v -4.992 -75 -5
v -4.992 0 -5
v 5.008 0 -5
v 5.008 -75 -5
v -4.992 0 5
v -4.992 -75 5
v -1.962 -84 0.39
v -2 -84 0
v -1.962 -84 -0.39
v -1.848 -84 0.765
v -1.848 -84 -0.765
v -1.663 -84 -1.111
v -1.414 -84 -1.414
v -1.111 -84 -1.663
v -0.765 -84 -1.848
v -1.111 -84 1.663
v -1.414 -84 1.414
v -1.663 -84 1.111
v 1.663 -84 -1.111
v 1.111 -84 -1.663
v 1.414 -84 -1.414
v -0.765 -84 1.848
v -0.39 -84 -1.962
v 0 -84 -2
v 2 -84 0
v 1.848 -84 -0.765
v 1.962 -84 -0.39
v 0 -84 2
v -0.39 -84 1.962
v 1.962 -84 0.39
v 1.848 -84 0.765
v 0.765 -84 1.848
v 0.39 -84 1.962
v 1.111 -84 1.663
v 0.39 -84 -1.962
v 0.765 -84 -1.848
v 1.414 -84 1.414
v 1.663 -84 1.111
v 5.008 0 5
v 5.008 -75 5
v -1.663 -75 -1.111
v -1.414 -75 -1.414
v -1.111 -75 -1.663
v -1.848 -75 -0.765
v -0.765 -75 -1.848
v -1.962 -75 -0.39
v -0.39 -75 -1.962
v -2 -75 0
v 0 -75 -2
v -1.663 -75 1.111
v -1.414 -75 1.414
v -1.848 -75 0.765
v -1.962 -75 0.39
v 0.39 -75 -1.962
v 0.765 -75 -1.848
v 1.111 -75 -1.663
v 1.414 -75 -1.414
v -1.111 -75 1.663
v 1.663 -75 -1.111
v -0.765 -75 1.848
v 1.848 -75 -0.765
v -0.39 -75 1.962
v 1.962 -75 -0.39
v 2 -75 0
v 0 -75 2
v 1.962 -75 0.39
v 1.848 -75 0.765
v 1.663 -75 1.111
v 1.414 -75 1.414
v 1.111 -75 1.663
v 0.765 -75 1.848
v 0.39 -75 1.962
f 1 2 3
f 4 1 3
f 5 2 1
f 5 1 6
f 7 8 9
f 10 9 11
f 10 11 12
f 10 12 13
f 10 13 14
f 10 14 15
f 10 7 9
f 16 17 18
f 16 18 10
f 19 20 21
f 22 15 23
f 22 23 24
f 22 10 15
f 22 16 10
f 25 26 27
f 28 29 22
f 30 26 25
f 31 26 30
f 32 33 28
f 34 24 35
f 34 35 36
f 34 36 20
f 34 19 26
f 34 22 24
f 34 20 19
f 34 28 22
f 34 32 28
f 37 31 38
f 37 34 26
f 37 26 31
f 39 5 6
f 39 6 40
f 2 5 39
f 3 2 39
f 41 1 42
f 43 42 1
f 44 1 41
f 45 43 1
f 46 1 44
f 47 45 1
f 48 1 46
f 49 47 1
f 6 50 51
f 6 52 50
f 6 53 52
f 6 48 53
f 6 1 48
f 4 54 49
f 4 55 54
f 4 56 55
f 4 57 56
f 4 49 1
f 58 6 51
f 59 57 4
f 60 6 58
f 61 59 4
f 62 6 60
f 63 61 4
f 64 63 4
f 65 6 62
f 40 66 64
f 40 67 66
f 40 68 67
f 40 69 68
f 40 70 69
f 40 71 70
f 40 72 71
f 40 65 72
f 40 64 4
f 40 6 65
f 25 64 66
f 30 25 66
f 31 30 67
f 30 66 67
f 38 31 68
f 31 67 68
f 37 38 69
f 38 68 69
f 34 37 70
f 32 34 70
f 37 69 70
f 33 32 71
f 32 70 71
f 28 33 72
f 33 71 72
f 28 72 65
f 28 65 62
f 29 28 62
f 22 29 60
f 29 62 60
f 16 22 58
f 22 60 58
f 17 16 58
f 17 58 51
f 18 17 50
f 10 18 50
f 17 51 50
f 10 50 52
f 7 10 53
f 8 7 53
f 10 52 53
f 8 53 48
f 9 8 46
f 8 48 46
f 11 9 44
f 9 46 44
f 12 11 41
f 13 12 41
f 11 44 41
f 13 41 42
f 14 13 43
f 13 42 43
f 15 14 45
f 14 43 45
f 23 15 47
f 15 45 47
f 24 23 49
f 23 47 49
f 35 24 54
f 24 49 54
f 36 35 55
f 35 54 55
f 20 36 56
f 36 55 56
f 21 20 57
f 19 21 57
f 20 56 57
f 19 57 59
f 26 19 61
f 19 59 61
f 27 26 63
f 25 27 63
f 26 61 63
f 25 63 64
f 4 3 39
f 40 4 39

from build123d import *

# Parameters (mm, degrees)
F0_W     = 10
F0_H     = 10
F1_DEPTH = 75
F2_R     = 2
F3_DEPTH = 9


with BuildPart() as f1:
    # F0 (on Front) → F1 (new body)
    with BuildSketch(Plane.XZ):
        with Locations((0.008259, 0)):
            Rectangle(F0_W, F0_H)
    extrude(amount=F1_DEPTH)

    # F2 (on face) → F3 (join)
    with BuildSketch(Plane.XZ.offset(75)):
        Circle(F2_R)
    extrude(amount=F3_DEPTH)


solid = f1.part
